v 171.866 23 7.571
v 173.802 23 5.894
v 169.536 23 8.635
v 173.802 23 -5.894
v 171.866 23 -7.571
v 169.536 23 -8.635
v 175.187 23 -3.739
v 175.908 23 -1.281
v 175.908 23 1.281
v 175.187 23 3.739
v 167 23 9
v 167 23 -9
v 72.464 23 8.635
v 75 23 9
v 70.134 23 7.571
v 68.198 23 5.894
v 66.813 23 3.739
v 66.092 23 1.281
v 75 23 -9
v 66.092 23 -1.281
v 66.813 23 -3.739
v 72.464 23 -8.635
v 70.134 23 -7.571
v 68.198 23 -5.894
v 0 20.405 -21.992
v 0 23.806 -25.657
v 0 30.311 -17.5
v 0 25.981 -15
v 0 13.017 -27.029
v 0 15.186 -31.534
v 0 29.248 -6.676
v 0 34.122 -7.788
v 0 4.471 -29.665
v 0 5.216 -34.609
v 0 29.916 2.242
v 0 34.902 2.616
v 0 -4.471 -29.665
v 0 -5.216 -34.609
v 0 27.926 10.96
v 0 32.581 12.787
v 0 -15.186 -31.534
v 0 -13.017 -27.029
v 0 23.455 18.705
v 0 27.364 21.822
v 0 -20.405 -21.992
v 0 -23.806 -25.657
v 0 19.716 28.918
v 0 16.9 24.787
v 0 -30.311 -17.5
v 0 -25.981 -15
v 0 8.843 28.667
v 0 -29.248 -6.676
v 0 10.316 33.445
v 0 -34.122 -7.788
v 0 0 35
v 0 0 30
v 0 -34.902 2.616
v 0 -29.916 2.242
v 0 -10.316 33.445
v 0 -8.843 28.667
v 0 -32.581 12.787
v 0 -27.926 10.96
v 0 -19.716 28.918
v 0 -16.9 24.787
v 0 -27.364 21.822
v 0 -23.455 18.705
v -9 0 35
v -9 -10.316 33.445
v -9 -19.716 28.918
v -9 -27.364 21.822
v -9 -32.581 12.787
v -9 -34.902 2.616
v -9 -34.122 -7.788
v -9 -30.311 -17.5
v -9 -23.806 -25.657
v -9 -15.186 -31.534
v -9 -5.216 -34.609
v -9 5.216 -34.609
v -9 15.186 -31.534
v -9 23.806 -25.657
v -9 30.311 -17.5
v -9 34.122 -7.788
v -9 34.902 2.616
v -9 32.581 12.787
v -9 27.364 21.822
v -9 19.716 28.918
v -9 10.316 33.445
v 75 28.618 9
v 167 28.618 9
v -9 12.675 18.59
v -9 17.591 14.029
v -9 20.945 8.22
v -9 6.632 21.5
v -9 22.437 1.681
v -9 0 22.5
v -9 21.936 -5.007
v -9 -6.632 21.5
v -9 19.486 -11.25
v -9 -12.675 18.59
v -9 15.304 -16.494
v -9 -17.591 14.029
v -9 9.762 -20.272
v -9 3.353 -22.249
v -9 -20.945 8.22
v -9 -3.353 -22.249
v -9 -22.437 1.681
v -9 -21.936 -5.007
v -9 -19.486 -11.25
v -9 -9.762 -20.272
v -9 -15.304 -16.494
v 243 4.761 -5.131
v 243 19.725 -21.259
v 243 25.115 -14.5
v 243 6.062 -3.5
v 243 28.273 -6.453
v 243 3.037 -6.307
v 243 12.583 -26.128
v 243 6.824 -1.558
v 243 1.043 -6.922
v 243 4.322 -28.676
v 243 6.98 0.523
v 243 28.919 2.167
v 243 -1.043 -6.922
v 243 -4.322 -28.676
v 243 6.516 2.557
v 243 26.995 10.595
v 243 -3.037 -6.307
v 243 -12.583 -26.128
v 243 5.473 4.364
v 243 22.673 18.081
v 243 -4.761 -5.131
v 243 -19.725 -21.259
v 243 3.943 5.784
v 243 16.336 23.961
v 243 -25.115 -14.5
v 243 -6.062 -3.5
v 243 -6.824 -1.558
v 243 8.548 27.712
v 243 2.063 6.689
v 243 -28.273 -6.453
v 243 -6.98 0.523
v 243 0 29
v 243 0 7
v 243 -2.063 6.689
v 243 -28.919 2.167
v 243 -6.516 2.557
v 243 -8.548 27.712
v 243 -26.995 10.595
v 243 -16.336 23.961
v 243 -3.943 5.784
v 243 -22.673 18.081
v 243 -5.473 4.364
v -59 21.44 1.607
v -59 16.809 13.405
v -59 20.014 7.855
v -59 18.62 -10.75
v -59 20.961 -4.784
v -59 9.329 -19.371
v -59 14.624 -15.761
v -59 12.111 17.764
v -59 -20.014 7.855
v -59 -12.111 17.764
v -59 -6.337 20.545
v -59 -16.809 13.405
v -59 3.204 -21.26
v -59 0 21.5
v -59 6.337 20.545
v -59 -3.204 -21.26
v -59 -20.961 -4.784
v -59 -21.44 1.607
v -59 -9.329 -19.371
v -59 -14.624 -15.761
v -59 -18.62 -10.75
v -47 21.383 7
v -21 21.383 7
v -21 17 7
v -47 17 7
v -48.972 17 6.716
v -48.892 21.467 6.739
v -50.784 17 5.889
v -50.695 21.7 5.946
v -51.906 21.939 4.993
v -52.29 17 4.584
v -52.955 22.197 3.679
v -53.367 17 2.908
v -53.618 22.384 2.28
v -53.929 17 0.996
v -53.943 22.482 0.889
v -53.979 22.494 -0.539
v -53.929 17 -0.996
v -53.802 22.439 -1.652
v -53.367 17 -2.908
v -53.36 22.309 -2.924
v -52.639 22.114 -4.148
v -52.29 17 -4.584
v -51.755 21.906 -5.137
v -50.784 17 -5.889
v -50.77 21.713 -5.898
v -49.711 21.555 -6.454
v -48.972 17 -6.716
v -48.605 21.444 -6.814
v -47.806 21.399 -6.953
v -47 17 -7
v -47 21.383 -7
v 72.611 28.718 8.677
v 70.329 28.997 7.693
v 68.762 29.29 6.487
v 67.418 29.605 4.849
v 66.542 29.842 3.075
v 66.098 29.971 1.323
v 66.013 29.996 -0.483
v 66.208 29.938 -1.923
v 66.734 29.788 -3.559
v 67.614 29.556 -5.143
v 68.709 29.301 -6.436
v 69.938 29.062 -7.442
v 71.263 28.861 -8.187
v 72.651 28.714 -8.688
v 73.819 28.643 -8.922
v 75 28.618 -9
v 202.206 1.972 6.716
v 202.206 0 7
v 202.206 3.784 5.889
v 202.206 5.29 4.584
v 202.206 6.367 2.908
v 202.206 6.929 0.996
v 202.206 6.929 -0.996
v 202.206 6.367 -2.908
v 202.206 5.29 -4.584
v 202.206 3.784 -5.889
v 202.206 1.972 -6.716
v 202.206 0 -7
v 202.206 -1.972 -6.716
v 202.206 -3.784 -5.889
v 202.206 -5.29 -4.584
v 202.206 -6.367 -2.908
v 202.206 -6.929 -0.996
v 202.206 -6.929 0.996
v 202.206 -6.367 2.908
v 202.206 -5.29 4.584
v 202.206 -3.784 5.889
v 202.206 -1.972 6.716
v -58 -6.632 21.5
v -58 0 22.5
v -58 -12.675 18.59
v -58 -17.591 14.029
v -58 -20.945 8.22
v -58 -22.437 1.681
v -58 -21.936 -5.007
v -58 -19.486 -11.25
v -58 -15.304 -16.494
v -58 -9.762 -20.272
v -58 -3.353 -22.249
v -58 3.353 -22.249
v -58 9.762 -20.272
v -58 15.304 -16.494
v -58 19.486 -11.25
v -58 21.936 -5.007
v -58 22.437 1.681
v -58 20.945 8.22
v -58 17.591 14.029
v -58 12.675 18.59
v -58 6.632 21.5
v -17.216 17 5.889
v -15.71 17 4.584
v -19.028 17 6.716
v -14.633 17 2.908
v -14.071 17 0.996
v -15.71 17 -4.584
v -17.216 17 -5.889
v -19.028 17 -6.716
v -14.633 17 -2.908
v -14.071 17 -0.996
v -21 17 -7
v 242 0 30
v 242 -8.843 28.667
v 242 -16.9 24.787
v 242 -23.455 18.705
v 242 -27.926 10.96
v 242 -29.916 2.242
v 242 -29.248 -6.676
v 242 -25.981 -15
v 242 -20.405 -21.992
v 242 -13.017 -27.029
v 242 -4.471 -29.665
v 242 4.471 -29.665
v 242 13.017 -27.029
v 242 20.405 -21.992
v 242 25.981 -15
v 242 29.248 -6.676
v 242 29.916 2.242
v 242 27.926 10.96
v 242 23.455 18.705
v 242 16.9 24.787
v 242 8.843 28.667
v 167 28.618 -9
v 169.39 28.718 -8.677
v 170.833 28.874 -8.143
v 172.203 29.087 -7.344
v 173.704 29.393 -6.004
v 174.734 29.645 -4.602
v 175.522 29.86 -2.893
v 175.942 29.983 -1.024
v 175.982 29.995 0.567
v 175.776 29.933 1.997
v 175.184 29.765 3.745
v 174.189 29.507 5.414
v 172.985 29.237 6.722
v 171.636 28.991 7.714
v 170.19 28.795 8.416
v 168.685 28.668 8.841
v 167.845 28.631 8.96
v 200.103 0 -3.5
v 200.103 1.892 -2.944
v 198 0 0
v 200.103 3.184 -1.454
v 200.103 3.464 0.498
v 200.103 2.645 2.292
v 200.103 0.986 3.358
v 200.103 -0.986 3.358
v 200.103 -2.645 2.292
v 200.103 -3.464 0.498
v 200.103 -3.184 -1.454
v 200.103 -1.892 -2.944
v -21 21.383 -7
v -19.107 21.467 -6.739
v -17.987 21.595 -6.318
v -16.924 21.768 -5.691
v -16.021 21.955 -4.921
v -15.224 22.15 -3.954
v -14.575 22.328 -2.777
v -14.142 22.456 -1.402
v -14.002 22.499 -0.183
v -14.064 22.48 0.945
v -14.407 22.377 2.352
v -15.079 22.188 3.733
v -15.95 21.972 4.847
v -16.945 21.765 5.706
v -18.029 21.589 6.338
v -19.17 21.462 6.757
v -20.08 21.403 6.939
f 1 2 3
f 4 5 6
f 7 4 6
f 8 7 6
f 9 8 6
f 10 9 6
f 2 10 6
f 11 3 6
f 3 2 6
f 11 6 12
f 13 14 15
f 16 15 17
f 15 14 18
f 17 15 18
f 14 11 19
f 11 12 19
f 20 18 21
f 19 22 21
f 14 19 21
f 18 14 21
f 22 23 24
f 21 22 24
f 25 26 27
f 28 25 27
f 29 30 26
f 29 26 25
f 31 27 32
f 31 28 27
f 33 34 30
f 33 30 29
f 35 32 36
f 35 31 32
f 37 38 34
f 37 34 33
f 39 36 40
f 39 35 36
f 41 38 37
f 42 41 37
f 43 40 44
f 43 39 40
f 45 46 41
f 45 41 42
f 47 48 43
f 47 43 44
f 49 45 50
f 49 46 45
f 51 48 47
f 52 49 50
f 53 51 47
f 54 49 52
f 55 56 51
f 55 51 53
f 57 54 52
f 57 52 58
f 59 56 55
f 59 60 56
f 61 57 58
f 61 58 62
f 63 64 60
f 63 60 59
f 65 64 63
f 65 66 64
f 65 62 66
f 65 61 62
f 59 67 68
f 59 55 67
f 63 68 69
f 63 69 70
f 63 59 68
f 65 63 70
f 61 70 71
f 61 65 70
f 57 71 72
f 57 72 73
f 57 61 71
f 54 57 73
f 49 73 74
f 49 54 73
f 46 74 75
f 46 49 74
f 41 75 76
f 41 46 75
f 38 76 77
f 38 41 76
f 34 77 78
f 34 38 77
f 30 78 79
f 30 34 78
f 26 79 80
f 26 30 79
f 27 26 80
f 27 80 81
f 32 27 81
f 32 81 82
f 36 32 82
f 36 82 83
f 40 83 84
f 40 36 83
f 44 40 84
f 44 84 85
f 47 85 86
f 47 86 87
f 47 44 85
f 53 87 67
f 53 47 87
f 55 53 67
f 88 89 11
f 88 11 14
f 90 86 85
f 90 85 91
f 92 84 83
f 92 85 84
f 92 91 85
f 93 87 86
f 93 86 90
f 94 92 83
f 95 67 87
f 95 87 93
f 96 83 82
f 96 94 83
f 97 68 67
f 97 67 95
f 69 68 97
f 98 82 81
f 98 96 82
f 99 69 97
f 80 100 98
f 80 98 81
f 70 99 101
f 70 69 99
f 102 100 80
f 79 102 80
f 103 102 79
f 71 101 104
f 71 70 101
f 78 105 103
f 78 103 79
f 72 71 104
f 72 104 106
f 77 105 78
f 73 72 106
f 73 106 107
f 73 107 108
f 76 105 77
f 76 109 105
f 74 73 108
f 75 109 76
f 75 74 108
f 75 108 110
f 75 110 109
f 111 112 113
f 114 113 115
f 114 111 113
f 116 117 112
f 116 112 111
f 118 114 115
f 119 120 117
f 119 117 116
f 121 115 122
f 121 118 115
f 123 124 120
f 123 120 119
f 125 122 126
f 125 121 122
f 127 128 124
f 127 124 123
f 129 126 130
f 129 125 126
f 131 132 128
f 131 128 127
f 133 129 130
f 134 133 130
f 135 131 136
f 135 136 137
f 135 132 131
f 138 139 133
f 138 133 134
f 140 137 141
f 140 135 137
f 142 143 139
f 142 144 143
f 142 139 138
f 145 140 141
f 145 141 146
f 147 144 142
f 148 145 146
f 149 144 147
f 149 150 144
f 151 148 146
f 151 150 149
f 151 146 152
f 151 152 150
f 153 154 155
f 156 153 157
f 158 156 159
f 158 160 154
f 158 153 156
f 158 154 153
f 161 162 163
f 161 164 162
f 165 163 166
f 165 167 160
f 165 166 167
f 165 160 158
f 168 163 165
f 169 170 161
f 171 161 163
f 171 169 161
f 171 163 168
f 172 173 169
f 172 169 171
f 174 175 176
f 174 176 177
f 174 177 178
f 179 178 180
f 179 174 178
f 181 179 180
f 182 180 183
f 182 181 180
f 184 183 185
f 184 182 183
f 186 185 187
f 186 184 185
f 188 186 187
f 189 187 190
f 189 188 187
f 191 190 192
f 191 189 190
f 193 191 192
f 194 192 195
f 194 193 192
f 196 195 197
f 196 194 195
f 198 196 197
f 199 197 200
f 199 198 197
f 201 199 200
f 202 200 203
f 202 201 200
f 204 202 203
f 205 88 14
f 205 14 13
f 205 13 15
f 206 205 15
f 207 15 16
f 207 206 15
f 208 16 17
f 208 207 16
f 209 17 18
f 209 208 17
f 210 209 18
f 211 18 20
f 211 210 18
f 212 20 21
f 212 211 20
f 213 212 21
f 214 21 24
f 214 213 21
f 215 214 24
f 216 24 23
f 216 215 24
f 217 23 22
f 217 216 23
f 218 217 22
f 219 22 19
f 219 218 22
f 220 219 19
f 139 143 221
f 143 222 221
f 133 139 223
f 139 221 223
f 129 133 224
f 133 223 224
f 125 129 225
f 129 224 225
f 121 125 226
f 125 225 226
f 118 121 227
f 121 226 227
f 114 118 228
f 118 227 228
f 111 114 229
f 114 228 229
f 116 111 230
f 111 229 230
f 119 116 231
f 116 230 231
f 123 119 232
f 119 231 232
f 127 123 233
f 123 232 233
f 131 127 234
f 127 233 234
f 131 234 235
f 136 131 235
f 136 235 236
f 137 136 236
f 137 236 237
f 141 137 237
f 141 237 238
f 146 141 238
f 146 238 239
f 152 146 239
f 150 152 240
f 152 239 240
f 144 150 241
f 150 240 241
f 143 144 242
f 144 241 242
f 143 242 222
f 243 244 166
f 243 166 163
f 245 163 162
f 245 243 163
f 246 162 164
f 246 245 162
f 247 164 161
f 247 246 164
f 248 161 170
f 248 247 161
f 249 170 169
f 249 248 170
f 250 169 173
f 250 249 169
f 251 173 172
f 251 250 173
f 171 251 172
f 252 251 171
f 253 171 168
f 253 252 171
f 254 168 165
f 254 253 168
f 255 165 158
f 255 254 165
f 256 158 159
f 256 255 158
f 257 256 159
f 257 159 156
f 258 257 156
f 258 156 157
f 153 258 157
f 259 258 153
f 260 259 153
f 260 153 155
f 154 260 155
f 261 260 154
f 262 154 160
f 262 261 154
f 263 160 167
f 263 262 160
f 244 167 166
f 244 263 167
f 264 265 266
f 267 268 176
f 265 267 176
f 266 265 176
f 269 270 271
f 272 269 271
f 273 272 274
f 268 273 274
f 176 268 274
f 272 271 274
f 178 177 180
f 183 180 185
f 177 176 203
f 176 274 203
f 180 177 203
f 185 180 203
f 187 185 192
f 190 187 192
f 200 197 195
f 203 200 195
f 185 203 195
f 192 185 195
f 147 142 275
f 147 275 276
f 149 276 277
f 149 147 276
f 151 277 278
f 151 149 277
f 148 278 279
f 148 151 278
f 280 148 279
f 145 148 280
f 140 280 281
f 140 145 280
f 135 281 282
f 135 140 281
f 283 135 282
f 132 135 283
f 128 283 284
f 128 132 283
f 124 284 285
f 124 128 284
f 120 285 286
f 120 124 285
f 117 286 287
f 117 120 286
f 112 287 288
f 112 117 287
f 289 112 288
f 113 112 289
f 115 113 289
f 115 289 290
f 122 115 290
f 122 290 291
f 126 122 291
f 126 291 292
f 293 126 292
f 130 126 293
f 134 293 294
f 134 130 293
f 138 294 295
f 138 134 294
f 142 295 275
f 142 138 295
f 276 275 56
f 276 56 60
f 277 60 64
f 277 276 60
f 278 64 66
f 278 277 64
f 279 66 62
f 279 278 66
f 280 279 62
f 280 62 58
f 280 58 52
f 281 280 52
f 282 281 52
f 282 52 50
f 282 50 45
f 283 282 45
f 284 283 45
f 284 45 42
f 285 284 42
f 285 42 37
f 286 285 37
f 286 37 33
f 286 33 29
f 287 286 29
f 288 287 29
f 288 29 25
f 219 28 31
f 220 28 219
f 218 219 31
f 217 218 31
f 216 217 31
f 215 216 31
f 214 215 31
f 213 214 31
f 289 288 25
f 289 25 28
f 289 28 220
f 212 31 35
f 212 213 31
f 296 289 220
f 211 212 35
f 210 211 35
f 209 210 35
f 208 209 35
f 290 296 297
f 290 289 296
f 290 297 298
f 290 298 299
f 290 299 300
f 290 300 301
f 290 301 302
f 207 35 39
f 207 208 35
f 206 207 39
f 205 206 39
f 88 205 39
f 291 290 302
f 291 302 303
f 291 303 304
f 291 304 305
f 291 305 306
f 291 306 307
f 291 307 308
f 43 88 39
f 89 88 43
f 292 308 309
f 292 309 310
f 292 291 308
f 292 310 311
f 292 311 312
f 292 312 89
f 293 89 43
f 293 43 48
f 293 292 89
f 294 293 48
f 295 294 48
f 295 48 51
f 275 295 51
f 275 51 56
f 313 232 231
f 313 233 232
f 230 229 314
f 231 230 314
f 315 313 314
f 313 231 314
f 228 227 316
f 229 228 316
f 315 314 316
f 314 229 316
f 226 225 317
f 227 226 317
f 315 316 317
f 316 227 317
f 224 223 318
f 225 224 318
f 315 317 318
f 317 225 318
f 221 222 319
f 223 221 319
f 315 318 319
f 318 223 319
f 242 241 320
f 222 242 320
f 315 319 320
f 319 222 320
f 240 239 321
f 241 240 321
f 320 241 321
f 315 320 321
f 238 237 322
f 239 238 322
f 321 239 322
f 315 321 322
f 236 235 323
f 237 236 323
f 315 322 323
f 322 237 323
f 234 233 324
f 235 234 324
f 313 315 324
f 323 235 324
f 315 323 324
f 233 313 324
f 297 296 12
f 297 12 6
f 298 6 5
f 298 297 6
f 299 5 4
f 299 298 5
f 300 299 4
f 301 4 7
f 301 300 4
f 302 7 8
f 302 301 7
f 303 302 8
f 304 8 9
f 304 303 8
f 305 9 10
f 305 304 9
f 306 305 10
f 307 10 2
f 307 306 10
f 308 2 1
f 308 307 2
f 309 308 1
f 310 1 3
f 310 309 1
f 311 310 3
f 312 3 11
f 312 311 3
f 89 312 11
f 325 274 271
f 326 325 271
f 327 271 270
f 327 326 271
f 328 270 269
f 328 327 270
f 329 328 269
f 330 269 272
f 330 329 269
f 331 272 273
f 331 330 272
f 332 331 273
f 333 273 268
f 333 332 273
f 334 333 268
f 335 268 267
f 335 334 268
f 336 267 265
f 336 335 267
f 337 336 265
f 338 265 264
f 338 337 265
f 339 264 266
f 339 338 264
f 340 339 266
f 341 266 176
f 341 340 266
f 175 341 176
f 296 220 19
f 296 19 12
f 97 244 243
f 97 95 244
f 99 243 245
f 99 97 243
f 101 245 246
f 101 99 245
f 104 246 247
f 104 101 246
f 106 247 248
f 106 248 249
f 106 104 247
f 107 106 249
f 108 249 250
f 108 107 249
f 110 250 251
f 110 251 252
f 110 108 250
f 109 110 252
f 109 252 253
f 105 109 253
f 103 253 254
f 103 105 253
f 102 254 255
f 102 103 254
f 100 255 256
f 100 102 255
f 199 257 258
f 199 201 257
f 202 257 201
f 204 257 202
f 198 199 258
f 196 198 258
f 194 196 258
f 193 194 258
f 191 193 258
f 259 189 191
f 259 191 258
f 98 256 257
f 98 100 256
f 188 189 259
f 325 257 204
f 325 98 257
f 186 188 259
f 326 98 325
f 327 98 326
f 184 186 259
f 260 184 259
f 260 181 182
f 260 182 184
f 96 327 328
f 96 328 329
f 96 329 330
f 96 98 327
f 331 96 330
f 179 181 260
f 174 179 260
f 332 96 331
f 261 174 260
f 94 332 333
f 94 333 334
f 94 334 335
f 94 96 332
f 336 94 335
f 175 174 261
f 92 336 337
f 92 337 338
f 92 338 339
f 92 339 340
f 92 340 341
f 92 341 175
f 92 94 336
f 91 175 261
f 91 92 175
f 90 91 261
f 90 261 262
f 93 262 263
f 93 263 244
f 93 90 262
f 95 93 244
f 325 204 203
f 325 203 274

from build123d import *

# Parameters (mm, degrees)
CHAMFER_1_SIZE         = 1
HOLE_WIZARD_M161_D     = 14
HOLE_WIZARD_M161_DEPTH = 40.793975667
HOLE_WIZARD_M161_TIP   = 4.206024333
CUT_EXTRUDE_1_DEPTH    = 7
CUT_EXTRUDE_2_DEPTH    = 5.5


with BuildPart() as part:
    # Эскиз1 → Повернуть1 (revolve)
    with BuildSketch(Plane.XY, mode=Mode.PRIVATE) as revolve_1_sk:
        Polygon((-59, 0), (-59, 22.5), (-9, 22.5), (-9, 35), (0, 35), (0, 30), (243, 30), (243, 0), align=None)
    revolve(revolve_1_sk.sketch.rotate(Axis((-233.488372093, 0, 0), (1, 0, 0)), 90), axis=Axis((-233.488372093, 0, 0), (1, 0, 0)))

    # Фаска1
    chamfer_1_edges = [part.edges().sort_by_distance(p)[0] for p in [
        (243, 0, -30),
        (-59, 0, -22.5),
    ]]
    chamfer(chamfer_1_edges, length=CHAMFER_1_SIZE)

    # Отверстие обработанное метчиком M161
    with Locations(Plane(origin=(243, 0, 0), x_dir=(0, 0, -1), z_dir=(1, 0, 0))):
        with Locations((0, 0)):
            Hole(HOLE_WIZARD_M161_D / 2, depth=HOLE_WIZARD_M161_DEPTH)
            with Locations((0, 0, -(HOLE_WIZARD_M161_DEPTH + HOLE_WIZARD_M161_TIP / 2))):  # 118° drill point
                Cone(0, HOLE_WIZARD_M161_D / 2, HOLE_WIZARD_M161_TIP, mode=Mode.SUBTRACT)

    # Эскиз4 → Вырез-Вытянуть1 (cut)
    with BuildSketch(Plane(origin=(0, 30, 0), x_dir=(1, 0, 0), z_dir=(0, 1, 0))):
        with BuildLine():
            Line((167, -9), (75, -9))
            ThreePointArc((75, -9), (66, 0), (75, 9))
            Line((75, 9), (167, 9))
            ThreePointArc((167, 9), (176, 0), (167, -9))
        make_face()
    extrude(amount=-CUT_EXTRUDE_1_DEPTH, mode=Mode.SUBTRACT)

    # Эскиз5 → Вырез-Вытянуть2 (cut)
    with BuildSketch(Plane(origin=(0, 22.5, 0), x_dir=(1, 0, 0), z_dir=(0, 1, 0))):
        with BuildLine():
            Line((-47, 7), (-21, 7))
            ThreePointArc((-21, 7), (-14, 0), (-21, -7))
            Line((-21, -7), (-47, -7))
            ThreePointArc((-47, -7), (-54, 0), (-47, 7))
        make_face()
    extrude(amount=-CUT_EXTRUDE_2_DEPTH, mode=Mode.SUBTRACT)


solid = part.part
